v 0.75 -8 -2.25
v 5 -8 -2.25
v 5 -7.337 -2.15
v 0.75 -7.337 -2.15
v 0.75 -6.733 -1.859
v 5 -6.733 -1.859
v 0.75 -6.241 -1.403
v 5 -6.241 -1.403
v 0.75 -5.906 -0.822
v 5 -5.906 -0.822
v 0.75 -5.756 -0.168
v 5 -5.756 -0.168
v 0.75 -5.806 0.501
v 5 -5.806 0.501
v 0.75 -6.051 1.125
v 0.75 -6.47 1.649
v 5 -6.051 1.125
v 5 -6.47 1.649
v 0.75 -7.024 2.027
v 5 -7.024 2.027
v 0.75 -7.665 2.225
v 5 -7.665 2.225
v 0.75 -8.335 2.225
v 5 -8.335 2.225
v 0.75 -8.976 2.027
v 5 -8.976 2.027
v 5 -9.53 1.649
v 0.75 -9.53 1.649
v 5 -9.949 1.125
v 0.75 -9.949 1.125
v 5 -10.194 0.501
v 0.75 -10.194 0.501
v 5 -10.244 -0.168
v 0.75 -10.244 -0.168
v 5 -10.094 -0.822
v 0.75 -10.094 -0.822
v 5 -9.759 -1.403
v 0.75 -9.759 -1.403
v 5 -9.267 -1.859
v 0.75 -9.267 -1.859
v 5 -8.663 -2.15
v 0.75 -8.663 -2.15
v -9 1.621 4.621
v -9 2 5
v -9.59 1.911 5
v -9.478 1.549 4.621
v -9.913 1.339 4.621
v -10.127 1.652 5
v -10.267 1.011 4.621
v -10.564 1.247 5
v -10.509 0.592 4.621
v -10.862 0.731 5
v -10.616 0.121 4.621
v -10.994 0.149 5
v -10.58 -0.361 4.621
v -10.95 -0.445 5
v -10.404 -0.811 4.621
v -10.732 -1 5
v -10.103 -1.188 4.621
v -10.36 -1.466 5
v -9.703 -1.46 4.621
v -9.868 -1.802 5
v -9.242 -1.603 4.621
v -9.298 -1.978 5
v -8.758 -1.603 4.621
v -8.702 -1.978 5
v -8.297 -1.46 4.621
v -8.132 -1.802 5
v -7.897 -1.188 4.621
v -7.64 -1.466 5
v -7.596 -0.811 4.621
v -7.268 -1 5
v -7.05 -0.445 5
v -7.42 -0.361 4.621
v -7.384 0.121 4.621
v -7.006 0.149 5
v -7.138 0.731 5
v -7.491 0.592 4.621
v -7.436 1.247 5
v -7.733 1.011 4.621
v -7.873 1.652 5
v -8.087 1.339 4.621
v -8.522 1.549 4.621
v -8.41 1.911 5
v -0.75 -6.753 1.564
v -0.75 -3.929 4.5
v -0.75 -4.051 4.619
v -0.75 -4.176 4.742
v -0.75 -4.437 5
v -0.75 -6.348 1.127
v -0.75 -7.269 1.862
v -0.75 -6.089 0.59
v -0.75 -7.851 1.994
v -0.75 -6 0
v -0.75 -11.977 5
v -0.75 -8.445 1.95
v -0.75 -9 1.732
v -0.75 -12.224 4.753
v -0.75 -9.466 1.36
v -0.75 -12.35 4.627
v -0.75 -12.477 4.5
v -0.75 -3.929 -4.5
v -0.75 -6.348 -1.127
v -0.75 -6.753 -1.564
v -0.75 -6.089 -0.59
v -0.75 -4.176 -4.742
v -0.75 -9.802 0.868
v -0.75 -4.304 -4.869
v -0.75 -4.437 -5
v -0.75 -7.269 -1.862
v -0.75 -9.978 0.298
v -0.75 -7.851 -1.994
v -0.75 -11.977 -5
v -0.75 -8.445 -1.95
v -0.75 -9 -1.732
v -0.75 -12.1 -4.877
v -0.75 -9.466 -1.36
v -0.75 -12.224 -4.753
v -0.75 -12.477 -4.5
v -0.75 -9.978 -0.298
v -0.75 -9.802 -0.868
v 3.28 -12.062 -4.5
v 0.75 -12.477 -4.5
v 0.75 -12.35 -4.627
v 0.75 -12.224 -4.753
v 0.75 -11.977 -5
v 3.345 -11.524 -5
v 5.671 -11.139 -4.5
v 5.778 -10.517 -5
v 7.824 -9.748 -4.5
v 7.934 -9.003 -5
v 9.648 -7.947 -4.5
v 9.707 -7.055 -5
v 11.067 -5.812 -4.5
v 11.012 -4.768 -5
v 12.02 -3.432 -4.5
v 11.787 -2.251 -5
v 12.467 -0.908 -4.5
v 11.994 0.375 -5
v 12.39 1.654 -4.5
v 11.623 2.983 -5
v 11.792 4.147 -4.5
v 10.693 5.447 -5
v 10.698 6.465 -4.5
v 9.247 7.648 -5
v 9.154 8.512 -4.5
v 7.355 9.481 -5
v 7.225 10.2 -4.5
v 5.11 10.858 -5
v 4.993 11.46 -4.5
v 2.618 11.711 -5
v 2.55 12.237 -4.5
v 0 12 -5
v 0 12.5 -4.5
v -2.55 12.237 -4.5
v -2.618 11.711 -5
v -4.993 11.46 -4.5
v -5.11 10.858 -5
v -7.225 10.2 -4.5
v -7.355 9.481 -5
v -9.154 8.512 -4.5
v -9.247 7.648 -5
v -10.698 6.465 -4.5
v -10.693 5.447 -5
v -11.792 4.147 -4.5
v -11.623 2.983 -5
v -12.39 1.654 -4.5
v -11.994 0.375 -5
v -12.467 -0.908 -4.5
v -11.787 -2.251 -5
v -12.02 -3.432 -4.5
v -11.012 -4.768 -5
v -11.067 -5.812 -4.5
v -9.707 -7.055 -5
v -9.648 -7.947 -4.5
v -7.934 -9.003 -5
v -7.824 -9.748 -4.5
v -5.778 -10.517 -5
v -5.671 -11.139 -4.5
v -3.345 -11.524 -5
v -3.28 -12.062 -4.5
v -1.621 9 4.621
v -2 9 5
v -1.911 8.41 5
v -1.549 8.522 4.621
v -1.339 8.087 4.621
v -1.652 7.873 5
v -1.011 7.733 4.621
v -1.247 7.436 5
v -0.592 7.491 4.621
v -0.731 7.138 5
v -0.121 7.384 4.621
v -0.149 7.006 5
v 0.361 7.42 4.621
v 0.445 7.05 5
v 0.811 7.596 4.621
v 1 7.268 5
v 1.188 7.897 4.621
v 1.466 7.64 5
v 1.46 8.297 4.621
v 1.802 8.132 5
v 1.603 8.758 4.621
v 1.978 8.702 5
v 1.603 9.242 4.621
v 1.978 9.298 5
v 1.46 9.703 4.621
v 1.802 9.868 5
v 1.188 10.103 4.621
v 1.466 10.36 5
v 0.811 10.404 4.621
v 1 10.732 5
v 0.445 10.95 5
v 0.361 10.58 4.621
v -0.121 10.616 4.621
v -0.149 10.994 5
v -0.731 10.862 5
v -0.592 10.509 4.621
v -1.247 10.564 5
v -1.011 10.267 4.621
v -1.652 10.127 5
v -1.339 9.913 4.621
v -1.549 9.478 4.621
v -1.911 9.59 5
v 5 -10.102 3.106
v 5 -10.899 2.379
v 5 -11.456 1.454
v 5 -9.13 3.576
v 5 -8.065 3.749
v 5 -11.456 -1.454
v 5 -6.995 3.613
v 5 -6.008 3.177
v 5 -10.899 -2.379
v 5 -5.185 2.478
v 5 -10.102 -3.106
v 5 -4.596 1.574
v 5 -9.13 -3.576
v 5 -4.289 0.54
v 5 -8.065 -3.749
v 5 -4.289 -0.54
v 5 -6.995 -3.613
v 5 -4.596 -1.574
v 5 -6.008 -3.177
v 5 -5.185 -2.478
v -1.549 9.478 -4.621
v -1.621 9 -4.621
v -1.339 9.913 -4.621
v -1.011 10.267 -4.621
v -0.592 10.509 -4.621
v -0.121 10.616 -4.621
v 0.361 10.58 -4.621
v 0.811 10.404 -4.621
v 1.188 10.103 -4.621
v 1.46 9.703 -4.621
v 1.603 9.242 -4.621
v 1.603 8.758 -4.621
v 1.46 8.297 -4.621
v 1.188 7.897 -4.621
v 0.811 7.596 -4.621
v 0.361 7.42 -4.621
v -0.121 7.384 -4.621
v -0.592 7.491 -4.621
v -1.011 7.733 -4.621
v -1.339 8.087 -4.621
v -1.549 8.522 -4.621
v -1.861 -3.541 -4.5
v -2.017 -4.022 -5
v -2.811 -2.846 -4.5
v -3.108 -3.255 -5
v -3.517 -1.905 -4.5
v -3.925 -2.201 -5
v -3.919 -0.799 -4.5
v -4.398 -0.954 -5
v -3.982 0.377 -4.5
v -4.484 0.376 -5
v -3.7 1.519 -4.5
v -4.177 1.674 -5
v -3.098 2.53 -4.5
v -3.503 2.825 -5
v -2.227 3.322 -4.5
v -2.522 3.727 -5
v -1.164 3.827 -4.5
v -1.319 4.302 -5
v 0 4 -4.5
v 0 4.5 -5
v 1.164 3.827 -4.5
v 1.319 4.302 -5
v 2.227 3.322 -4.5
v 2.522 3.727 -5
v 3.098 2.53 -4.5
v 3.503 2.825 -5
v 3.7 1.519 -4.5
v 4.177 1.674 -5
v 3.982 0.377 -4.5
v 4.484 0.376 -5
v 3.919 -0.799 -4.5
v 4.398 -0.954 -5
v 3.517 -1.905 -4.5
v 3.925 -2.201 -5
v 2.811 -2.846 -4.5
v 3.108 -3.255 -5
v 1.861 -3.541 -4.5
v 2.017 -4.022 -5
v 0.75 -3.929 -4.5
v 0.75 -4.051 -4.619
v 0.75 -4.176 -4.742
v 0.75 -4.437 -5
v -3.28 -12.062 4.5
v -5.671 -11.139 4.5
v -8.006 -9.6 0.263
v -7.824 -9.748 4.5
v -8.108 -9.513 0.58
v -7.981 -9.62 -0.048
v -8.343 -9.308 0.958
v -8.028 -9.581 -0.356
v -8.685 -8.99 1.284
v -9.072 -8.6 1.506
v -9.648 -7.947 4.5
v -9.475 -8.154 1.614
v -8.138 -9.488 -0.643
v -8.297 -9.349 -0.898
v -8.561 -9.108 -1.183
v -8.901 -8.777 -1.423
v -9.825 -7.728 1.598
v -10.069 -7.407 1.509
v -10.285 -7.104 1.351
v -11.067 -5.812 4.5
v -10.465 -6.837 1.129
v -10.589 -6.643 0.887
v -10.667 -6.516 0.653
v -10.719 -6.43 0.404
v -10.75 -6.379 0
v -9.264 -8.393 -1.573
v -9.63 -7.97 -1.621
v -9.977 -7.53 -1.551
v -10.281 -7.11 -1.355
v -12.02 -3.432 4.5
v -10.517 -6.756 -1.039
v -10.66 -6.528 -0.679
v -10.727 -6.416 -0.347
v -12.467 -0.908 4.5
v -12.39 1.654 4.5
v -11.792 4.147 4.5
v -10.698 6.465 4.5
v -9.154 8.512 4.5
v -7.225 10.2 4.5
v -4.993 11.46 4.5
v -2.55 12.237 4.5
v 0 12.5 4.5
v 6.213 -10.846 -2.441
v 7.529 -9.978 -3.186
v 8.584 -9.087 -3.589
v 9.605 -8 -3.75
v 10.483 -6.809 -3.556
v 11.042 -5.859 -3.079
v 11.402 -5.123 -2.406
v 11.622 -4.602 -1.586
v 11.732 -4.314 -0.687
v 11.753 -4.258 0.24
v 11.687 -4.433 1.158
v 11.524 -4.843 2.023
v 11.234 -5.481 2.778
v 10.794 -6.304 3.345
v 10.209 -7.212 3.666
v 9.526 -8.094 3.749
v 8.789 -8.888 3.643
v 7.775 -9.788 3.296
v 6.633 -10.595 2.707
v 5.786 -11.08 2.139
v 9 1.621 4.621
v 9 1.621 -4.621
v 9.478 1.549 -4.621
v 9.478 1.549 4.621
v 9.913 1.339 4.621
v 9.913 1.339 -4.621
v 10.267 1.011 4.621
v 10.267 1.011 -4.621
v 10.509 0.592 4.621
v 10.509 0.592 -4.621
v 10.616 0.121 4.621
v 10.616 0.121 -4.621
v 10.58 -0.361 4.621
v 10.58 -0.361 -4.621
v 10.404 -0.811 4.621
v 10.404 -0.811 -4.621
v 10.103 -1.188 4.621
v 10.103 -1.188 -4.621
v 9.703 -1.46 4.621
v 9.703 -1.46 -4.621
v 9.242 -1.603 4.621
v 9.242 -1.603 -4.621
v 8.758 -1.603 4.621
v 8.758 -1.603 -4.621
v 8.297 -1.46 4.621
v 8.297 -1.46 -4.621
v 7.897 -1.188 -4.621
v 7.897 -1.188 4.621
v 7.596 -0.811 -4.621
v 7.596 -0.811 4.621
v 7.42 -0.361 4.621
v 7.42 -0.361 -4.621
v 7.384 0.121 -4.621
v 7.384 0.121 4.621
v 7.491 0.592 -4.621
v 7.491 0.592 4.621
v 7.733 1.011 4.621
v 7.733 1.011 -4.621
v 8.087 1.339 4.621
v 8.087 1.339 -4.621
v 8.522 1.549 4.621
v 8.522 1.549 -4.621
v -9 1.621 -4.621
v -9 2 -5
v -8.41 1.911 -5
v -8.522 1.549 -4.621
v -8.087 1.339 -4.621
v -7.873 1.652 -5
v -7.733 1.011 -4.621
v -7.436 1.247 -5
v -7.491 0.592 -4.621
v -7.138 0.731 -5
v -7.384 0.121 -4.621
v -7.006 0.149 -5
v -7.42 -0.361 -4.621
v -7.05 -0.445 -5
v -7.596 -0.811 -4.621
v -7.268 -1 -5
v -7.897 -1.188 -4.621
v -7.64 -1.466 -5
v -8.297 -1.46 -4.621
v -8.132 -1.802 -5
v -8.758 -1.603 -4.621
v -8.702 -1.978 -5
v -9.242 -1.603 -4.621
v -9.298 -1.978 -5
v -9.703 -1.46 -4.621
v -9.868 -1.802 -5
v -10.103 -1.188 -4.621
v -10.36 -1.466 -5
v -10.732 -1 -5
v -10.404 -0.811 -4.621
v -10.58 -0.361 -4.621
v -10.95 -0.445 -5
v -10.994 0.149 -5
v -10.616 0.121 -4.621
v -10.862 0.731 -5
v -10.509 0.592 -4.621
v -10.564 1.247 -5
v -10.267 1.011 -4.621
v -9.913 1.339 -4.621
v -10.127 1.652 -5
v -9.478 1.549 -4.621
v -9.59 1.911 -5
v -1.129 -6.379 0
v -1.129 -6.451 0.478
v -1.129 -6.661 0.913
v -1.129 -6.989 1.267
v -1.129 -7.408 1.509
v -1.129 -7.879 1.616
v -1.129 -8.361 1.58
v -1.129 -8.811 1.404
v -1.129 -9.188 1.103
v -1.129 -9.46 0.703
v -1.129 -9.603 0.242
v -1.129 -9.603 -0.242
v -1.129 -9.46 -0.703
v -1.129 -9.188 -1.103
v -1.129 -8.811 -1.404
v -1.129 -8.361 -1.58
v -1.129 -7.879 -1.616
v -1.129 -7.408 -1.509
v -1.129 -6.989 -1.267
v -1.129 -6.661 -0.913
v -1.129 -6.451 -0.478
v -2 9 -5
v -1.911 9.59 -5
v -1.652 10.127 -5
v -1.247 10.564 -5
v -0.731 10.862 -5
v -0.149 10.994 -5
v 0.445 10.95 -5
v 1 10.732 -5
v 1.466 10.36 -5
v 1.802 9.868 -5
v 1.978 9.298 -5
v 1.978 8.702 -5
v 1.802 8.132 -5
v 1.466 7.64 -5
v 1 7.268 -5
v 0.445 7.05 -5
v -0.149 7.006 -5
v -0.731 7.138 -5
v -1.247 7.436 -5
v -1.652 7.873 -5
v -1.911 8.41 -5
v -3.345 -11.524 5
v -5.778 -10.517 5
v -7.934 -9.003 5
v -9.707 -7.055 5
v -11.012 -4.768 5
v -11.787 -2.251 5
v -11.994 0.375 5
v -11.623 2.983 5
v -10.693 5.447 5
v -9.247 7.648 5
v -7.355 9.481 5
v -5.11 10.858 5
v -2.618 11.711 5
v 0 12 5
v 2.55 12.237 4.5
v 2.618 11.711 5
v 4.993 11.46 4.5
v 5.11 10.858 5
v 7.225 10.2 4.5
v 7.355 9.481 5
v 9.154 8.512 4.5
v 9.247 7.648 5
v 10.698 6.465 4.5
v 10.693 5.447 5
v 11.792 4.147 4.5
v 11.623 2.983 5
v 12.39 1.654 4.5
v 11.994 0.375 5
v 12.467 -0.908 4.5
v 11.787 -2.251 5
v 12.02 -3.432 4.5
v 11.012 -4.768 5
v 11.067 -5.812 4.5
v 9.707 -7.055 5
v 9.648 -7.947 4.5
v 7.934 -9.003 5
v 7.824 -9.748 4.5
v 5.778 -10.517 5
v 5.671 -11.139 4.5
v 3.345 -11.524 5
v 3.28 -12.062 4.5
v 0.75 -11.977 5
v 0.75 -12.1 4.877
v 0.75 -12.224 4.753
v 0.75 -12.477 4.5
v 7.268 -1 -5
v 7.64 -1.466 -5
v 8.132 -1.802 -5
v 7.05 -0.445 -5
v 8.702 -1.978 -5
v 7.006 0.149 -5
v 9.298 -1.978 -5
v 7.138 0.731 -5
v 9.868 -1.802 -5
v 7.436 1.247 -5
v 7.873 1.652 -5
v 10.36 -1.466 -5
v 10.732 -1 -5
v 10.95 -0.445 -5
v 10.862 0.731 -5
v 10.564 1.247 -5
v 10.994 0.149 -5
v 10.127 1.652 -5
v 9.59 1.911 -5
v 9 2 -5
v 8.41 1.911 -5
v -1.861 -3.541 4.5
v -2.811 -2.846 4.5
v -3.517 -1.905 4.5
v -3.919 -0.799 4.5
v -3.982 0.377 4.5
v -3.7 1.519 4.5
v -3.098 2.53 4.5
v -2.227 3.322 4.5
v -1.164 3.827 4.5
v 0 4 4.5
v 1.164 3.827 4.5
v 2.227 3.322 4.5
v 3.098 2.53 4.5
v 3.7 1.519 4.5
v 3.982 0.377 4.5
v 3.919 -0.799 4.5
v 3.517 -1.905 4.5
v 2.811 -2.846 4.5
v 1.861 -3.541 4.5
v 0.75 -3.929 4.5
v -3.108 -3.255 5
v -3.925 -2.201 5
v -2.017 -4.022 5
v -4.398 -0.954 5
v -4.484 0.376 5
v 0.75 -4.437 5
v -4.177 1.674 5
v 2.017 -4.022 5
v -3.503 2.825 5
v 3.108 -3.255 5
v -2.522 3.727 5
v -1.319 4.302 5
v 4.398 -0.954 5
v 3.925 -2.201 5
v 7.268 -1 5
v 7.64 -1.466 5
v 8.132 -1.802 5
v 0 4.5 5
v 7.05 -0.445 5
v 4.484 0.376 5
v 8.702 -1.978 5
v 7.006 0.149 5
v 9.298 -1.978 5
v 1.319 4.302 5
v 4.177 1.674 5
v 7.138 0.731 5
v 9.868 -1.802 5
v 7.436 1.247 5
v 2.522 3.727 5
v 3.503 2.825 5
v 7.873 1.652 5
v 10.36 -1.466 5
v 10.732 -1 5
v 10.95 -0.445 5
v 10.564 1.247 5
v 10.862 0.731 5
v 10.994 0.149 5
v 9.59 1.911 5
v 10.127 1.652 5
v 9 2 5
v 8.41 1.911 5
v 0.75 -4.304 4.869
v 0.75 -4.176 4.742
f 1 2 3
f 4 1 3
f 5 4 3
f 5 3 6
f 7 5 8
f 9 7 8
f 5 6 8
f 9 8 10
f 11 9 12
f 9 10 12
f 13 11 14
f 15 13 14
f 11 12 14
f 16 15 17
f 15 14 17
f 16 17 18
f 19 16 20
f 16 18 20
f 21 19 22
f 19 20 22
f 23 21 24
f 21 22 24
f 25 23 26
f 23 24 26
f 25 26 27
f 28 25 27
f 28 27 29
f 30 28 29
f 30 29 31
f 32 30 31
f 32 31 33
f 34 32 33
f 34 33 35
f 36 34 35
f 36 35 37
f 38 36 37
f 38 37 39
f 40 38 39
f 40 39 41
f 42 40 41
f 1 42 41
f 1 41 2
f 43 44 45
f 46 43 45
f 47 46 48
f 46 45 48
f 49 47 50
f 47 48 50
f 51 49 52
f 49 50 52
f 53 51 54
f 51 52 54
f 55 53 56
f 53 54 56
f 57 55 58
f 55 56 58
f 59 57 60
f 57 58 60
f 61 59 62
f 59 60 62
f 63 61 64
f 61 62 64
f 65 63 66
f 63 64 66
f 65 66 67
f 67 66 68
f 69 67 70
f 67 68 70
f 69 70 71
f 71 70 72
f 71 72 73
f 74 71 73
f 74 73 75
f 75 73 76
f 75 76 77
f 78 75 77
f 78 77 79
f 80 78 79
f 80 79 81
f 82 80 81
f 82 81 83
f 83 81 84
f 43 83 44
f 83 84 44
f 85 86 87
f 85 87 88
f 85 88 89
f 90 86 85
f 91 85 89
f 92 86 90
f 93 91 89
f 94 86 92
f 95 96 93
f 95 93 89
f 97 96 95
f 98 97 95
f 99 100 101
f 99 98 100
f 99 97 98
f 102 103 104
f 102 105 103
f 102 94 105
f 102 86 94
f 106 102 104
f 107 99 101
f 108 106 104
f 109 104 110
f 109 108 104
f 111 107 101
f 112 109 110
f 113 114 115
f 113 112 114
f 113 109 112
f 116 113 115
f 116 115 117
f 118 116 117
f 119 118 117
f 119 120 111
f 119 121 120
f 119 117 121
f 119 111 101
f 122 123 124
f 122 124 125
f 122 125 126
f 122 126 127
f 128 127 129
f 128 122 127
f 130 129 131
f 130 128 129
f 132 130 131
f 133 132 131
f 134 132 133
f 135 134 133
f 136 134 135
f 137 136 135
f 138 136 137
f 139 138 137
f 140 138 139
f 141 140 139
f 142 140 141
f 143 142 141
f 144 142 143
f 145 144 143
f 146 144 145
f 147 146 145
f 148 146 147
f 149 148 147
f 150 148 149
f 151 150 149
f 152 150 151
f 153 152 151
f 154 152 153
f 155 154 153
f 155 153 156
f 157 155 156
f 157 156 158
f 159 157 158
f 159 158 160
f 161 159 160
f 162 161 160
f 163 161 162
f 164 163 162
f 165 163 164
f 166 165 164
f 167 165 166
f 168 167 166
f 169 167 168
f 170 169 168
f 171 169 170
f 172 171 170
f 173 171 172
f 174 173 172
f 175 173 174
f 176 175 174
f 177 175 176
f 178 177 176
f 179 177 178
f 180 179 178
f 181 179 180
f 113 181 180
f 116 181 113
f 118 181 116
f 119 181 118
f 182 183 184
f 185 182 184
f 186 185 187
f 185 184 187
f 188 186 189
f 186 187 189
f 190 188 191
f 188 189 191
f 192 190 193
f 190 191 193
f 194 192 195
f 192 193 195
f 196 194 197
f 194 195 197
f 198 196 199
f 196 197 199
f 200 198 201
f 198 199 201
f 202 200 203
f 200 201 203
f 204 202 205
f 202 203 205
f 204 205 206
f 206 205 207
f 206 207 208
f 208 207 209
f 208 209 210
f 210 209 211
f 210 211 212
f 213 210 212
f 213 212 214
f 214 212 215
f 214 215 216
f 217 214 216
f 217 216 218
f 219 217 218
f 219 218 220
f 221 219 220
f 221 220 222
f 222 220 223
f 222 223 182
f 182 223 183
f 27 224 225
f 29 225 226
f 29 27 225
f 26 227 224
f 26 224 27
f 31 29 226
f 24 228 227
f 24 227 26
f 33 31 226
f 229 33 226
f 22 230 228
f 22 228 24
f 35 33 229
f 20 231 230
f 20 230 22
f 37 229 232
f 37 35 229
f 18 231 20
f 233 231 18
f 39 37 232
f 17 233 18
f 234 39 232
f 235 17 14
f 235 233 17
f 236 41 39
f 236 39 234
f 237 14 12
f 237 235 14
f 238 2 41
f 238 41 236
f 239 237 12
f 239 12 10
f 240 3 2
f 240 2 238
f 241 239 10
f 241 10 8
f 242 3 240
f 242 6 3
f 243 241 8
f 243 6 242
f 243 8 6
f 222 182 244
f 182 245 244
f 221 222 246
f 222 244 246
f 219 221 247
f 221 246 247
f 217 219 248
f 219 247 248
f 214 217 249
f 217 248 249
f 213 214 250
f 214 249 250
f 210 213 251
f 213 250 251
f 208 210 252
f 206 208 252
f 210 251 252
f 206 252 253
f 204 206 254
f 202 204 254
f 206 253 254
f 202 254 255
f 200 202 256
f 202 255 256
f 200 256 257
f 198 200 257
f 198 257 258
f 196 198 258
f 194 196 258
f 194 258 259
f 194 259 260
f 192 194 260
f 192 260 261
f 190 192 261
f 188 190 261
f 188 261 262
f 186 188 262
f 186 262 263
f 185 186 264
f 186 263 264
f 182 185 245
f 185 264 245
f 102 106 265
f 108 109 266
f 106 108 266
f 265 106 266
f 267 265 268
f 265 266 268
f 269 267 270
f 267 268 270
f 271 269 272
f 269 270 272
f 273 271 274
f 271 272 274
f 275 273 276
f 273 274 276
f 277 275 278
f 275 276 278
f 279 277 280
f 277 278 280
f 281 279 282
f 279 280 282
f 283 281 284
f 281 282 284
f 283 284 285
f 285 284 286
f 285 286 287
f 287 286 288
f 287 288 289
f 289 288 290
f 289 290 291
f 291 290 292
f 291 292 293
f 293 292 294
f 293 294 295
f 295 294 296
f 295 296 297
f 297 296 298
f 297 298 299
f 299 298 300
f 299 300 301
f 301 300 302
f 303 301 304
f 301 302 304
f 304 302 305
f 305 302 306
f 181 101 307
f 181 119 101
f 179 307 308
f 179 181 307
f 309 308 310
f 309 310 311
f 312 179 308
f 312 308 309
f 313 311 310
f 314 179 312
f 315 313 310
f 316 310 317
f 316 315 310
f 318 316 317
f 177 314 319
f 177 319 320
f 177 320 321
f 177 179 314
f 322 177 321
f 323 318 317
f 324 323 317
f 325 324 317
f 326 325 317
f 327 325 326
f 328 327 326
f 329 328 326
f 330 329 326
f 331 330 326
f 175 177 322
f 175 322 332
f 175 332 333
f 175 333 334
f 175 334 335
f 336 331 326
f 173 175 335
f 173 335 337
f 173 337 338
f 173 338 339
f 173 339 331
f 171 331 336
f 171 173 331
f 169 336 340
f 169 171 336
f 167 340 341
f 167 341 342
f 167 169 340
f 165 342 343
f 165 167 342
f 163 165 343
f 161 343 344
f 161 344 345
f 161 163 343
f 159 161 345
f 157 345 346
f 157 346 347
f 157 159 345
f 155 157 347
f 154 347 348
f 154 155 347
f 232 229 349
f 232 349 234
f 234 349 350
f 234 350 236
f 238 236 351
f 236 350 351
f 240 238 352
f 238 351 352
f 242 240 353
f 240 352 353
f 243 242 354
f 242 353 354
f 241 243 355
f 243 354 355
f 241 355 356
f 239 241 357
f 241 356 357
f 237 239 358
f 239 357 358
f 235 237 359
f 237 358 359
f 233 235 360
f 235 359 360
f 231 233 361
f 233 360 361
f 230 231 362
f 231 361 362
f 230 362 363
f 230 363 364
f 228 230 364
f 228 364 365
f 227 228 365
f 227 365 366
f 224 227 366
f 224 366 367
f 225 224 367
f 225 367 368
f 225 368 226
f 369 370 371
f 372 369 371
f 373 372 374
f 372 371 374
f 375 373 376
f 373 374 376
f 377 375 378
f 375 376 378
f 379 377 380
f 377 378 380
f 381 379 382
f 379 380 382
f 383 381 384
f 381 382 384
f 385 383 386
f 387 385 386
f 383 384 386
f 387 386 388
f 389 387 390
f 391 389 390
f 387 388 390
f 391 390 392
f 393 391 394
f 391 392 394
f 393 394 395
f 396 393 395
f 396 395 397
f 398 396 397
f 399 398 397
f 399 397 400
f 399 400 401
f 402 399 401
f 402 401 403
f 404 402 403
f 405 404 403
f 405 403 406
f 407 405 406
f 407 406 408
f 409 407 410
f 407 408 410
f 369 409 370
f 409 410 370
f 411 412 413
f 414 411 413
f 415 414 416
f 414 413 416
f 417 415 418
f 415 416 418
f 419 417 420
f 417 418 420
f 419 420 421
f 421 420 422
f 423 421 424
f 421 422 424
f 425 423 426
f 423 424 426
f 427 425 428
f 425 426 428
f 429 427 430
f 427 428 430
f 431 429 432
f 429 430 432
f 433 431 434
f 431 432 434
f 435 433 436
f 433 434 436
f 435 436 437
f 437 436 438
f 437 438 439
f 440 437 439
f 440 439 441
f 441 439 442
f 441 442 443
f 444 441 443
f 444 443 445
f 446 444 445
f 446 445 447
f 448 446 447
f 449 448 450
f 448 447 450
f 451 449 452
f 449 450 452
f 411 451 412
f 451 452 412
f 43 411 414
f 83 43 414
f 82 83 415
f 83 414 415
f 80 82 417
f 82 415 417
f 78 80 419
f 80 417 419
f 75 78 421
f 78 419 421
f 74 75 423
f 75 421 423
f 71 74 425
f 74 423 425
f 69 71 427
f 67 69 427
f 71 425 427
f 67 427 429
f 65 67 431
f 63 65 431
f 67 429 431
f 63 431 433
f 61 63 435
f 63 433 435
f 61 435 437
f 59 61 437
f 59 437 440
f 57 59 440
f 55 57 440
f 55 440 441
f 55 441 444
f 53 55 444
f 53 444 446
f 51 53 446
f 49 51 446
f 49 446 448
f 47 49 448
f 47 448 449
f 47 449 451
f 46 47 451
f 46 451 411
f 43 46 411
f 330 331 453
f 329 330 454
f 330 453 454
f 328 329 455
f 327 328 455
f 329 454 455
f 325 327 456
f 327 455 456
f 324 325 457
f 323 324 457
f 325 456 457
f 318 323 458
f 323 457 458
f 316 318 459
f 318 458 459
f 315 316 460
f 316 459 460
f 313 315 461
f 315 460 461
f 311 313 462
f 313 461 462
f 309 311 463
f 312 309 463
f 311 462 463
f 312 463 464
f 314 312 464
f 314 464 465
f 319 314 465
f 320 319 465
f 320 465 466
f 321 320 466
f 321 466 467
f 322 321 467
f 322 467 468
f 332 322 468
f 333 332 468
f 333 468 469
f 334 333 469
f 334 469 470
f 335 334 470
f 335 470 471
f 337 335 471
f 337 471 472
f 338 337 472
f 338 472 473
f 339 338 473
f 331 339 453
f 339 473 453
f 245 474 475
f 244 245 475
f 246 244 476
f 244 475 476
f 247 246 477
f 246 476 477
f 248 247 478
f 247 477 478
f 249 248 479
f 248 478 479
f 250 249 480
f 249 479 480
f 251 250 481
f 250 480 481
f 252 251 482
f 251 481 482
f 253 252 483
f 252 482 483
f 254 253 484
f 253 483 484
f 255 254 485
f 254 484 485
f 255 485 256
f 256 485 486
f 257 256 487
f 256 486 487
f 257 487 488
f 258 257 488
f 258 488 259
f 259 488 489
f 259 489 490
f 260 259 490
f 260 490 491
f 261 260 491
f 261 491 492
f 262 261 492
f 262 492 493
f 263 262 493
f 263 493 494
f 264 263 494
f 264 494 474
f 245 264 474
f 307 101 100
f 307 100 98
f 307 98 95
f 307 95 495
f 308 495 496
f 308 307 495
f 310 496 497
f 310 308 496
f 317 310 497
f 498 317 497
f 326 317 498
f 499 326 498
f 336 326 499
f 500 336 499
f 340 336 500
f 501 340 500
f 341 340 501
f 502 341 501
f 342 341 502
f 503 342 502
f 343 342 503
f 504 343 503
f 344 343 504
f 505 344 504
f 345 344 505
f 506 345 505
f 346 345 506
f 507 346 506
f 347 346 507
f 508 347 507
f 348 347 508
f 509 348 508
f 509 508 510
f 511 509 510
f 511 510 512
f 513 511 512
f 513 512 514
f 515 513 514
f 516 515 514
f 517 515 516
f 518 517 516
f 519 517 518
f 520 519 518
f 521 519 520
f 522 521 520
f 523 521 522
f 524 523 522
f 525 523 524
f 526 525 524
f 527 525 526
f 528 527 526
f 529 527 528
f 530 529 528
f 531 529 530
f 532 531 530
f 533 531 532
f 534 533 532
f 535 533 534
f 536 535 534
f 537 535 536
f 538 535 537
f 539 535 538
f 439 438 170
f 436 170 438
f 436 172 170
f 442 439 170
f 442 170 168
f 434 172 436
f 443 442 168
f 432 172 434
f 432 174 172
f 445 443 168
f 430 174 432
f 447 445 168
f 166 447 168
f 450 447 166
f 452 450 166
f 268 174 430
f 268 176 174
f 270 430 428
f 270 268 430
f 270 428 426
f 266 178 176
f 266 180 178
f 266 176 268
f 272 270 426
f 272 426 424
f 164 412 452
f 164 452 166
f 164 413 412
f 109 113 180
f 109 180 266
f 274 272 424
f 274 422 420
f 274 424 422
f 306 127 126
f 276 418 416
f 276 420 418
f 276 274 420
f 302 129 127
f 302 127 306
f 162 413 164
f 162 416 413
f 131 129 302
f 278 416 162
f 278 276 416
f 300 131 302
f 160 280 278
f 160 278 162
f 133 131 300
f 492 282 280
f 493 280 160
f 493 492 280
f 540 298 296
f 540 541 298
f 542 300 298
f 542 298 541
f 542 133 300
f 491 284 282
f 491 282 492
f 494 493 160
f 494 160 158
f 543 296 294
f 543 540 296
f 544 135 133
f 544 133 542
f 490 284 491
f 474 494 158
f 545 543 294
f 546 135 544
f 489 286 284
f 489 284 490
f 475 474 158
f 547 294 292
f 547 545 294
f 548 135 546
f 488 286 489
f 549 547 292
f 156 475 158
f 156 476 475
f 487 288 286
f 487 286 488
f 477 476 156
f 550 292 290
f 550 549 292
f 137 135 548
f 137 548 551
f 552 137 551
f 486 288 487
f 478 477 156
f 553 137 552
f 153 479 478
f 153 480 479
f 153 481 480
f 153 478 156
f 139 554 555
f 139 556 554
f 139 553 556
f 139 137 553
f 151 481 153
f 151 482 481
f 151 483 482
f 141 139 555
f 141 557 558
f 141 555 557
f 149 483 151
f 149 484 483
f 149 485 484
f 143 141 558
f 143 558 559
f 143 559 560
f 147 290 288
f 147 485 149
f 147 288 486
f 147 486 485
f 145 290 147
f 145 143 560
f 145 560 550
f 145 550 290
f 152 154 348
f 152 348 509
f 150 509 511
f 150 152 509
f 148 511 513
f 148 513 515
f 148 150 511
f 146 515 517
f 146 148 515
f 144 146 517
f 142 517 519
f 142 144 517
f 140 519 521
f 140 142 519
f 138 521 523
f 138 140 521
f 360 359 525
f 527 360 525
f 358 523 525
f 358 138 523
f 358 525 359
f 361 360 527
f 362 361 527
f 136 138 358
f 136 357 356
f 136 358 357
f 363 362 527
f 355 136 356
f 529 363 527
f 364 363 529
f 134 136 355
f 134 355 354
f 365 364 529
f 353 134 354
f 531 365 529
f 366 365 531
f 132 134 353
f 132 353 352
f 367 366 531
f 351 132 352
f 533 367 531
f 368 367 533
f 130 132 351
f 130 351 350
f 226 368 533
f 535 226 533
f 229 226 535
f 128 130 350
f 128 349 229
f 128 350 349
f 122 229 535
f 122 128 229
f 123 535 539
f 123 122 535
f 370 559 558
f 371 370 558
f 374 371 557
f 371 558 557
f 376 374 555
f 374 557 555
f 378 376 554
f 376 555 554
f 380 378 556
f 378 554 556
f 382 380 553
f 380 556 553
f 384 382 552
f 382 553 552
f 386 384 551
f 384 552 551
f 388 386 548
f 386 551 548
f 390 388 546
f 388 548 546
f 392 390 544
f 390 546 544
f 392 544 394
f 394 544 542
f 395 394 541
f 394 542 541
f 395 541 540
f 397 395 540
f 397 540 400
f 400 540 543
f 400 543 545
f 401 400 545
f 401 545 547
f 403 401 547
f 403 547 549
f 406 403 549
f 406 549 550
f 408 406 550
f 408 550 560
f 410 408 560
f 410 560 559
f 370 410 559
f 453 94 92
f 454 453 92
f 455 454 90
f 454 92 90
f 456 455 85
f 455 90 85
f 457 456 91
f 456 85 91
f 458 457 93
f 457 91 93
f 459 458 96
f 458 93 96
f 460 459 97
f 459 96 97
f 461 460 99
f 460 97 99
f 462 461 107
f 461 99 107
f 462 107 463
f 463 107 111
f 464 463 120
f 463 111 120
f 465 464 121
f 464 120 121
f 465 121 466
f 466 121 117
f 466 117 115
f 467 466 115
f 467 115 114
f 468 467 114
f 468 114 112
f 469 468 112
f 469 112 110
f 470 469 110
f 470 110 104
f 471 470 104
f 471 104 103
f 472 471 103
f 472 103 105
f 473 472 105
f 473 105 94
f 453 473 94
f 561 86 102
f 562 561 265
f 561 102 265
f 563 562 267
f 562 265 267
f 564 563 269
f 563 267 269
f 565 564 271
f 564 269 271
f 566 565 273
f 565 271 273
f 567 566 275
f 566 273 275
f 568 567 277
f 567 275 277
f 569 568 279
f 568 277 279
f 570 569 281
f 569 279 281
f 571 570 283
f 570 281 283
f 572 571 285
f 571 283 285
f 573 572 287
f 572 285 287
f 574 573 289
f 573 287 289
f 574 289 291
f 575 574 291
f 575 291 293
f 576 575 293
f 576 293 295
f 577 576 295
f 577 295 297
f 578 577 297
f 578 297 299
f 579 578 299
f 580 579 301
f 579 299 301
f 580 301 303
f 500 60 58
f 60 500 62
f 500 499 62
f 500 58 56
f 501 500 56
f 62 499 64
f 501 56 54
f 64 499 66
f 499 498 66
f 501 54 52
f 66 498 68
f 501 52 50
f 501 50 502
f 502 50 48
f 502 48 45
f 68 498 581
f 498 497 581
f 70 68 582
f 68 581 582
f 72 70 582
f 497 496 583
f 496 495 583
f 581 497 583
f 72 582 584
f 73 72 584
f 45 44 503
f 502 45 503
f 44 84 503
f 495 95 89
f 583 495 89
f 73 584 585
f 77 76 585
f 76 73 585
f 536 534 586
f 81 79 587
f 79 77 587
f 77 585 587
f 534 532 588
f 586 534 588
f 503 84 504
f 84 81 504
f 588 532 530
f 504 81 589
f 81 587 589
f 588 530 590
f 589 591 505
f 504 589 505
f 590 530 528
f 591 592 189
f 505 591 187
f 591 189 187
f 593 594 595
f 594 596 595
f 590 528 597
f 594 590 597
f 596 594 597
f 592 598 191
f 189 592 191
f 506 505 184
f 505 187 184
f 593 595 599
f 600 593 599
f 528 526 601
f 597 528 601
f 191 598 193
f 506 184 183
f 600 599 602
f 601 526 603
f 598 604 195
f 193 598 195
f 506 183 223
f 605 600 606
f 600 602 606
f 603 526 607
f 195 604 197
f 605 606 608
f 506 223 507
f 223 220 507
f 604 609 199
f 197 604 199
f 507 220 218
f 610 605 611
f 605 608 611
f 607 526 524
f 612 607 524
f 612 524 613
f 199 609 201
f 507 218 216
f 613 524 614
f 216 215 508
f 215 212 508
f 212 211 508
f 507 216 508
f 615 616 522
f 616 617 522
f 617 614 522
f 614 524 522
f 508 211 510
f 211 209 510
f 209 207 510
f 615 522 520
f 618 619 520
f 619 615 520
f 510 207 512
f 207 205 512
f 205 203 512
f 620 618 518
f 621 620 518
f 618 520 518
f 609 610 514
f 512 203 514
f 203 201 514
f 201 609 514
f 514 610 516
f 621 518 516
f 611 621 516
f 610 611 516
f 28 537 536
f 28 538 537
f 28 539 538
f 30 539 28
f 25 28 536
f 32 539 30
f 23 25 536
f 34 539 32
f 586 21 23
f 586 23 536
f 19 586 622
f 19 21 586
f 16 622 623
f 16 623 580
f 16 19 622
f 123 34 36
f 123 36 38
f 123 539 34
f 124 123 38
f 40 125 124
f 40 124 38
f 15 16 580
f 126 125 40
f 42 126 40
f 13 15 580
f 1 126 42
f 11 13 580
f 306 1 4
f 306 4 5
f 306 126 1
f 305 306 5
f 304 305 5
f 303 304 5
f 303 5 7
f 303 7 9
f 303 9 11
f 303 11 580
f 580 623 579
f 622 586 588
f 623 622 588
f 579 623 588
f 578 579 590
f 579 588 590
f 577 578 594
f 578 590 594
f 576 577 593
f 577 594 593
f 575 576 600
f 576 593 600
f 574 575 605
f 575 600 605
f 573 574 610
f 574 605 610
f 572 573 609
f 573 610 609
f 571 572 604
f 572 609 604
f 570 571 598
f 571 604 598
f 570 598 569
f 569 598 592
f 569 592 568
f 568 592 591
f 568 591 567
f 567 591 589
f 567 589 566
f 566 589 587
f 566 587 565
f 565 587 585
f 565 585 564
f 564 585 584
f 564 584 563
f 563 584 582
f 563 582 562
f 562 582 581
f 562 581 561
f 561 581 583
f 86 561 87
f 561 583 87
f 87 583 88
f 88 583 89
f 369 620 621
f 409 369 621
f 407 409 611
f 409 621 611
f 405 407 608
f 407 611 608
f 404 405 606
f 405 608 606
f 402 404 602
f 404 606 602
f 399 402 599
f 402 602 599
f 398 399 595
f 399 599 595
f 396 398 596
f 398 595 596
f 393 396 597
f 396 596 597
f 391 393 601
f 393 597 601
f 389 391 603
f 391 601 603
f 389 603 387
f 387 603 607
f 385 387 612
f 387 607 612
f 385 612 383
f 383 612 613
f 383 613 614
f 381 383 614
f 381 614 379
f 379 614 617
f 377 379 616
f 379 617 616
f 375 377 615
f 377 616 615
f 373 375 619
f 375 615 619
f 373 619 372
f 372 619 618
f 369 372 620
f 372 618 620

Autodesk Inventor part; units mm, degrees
sketch "Sketch_14" plane through (0, 0, 0) normal (1, 0, 0) x (0, 1, 0)
  line L0 (0, -5) -> (0, 5)
  line L1 (0, 5) -> (12, 5)
  line L2 (12, 5) -> (12.5, 4.5)
  line L3 (12.5, 4.5) -> (12.5, -4.5)
  line L4 (12.5, -4.5) -> (12, -5)
  line L5 (12, -5) -> (0, -5)
  line L6 (0, -5) -> (0, 5)
revolve "Revolution1" add sketch "Sketch_14" angle 360 about axis through (0, 0, -5) along (0, 0, -1)
sketch "Sketch_15" plane through (0, 0, 0) normal (1, 0, 0) x (0, 1, 0)
  line L0 (0, -5) -> (0, 5)
  line L1 (0, 5) -> (4.5, 5)
  line L2 (4.5, 5) -> (4, 4.5)
  line L3 (4, 4.5) -> (4, -4.5)
  line L4 (4, -4.5) -> (4.5, -5)
  line L5 (4.5, -5) -> (0, -5)
  line L6 (0, -5) -> (0, 5)
revolve "Revolution2" cut sketch "Sketch_15" angle 360 about axis through (0, 0, -5) along (0, 0, -1)
sketch "Sketch_16" plane through (0, 0, 0) normal (0, 0, 1) x (1, 0, 0)
  arc A0 (-0.75, -13.4792) -> (0.75, -13.4792) centre (0, 0) ccw
  line L0 (0.75, -13.4792) -> (0.75, 0)
  line L1 (0.75, 0) -> (-0.75, 0)
  line L2 (-0.75, 0) -> (-0.75, -13.4792)
extrude "Extrusion1" cut sketch "Sketch_16" along normal mid plane 10
sketch "Sketch_18" plane through (9, 0, 0) normal (1, 0, 0) x (0, 0, -1)
  line L0 (5, 0) -> (-5, 0)
  line L1 (-5, 0) -> (-5, 2)
  line L2 (-5, 2) -> (-4.621, 1.621)
  line L3 (-4.621, 1.621) -> (4.621, 1.621)
  line L4 (4.621, 1.621) -> (5, 2)
  line L5 (5, 2) -> (5, 0)
  line L6 (5, 0) -> (-5, 0)
revolve "Revolution3" cut sketch "Sketch_18" angle 360 about axis through (9, 0, -5) along (0, 0, -1)
thread "Thread1" size "M4x0.7" class "6H" standard "ISO Metric profile" full length
sketch "Sketch_20" plane through (-9, 0, 0) normal (1, 0, 0) x (0, 0, -1)
  line L0 (5, 0) -> (-5, 0)
  line L1 (-5, 0) -> (-5, 2)
  line L2 (-5, 2) -> (-4.621, 1.621)
  line L3 (-4.621, 1.621) -> (4.621, 1.621)
  line L4 (4.621, 1.621) -> (5, 2)
  line L5 (5, 2) -> (5, 0)
  line L6 (5, 0) -> (-5, 0)
revolve "Revolution4" cut sketch "Sketch_20" angle 360 about axis through (-9, 0, -5) along (0, 0, -1)
thread "Thread2" size "M4x0.7" class "6H" standard "ISO Metric profile" full length
sketch "Sketch_22" plane through (0, 9, 0) normal (0, 1, 0) x (1, 0, 0)
  line L0 (0, 5) -> (0, -5)
  line L1 (0, -5) -> (-2, -5)
  line L2 (-2, -5) -> (-1.621, -4.621)
  line L3 (-1.621, -4.621) -> (-1.621, 4.621)
  line L4 (-1.621, 4.621) -> (-2, 5)
  line L5 (-2, 5) -> (0, 5)
  line L6 (0, 5) -> (0, -5)
revolve "Revolution5" cut sketch "Sketch_22" angle 360 about axis through (0, 9, -5) along (0, 0, -1)
thread "Thread3" size "M4x0.7" class "6H" standard "ISO Metric profile" full length
sketch "Sketch_23" plane through (0, -8, 0) normal (0, 1, 0) x (1, 0, 0)
  line L0 (12.5, 0) -> (0, 0)
  line L1 (0, 0) -> (0, 2.25)
  line L2 (0, 2.25) -> (5, 2.25)
  line L3 (5, 2.25) -> (5, 3.75)
  line L4 (5, 3.75) -> (12.5, 3.75)
  line L5 (12.5, 3.75) -> (12.5, 0)
  line L6 (12.5, 0) -> (0, 0)
revolve "Revolution6" cut sketch "Sketch_23" angle 360 about axis through (12.5, -8, 0) along (1, 0, 0)
sketch "Sketch_25" plane through (0, 0, 0) normal (0, 0, 1) x (1, 0, 0)
  line L0 (-0.75, -8) -> (-10.9659, -8)
  line L1 (-10.9659, -8) -> (-10.9659, -6.379)
  line L2 (-10.9659, -6.379) -> (-1.129, -6.379)
  line L3 (-1.129, -6.379) -> (-0.75, -6)
  line L4 (-0.75, -6) -> (-0.75, -8)
  line L5 (-0.75, -8) -> (-10.9659, -8)
revolve "Revolution7" cut sketch "Sketch_25" angle 360 about axis through (-0.75, -8, 0) along (1, 0, 0)
thread "Thread4" size "M4x0.7" class "6H" standard "ISO Metric profile" length 9.8369
ref_plane "to_bolt_XY" through (5, -8, 0) normal (1, 0, 0) x (0, 0, -1)
ref_plane "to_bolt_YZ" through (5, -8, 0) normal (0, 0, -1) x (0, 1, 0)
ref_plane "to_bolt_ZX" through (5, -8, 0) normal (0, 1, 0) x (1, 0, 0)
properties part number "SCSTR8-10b" material "鋼、炭素鋼"
